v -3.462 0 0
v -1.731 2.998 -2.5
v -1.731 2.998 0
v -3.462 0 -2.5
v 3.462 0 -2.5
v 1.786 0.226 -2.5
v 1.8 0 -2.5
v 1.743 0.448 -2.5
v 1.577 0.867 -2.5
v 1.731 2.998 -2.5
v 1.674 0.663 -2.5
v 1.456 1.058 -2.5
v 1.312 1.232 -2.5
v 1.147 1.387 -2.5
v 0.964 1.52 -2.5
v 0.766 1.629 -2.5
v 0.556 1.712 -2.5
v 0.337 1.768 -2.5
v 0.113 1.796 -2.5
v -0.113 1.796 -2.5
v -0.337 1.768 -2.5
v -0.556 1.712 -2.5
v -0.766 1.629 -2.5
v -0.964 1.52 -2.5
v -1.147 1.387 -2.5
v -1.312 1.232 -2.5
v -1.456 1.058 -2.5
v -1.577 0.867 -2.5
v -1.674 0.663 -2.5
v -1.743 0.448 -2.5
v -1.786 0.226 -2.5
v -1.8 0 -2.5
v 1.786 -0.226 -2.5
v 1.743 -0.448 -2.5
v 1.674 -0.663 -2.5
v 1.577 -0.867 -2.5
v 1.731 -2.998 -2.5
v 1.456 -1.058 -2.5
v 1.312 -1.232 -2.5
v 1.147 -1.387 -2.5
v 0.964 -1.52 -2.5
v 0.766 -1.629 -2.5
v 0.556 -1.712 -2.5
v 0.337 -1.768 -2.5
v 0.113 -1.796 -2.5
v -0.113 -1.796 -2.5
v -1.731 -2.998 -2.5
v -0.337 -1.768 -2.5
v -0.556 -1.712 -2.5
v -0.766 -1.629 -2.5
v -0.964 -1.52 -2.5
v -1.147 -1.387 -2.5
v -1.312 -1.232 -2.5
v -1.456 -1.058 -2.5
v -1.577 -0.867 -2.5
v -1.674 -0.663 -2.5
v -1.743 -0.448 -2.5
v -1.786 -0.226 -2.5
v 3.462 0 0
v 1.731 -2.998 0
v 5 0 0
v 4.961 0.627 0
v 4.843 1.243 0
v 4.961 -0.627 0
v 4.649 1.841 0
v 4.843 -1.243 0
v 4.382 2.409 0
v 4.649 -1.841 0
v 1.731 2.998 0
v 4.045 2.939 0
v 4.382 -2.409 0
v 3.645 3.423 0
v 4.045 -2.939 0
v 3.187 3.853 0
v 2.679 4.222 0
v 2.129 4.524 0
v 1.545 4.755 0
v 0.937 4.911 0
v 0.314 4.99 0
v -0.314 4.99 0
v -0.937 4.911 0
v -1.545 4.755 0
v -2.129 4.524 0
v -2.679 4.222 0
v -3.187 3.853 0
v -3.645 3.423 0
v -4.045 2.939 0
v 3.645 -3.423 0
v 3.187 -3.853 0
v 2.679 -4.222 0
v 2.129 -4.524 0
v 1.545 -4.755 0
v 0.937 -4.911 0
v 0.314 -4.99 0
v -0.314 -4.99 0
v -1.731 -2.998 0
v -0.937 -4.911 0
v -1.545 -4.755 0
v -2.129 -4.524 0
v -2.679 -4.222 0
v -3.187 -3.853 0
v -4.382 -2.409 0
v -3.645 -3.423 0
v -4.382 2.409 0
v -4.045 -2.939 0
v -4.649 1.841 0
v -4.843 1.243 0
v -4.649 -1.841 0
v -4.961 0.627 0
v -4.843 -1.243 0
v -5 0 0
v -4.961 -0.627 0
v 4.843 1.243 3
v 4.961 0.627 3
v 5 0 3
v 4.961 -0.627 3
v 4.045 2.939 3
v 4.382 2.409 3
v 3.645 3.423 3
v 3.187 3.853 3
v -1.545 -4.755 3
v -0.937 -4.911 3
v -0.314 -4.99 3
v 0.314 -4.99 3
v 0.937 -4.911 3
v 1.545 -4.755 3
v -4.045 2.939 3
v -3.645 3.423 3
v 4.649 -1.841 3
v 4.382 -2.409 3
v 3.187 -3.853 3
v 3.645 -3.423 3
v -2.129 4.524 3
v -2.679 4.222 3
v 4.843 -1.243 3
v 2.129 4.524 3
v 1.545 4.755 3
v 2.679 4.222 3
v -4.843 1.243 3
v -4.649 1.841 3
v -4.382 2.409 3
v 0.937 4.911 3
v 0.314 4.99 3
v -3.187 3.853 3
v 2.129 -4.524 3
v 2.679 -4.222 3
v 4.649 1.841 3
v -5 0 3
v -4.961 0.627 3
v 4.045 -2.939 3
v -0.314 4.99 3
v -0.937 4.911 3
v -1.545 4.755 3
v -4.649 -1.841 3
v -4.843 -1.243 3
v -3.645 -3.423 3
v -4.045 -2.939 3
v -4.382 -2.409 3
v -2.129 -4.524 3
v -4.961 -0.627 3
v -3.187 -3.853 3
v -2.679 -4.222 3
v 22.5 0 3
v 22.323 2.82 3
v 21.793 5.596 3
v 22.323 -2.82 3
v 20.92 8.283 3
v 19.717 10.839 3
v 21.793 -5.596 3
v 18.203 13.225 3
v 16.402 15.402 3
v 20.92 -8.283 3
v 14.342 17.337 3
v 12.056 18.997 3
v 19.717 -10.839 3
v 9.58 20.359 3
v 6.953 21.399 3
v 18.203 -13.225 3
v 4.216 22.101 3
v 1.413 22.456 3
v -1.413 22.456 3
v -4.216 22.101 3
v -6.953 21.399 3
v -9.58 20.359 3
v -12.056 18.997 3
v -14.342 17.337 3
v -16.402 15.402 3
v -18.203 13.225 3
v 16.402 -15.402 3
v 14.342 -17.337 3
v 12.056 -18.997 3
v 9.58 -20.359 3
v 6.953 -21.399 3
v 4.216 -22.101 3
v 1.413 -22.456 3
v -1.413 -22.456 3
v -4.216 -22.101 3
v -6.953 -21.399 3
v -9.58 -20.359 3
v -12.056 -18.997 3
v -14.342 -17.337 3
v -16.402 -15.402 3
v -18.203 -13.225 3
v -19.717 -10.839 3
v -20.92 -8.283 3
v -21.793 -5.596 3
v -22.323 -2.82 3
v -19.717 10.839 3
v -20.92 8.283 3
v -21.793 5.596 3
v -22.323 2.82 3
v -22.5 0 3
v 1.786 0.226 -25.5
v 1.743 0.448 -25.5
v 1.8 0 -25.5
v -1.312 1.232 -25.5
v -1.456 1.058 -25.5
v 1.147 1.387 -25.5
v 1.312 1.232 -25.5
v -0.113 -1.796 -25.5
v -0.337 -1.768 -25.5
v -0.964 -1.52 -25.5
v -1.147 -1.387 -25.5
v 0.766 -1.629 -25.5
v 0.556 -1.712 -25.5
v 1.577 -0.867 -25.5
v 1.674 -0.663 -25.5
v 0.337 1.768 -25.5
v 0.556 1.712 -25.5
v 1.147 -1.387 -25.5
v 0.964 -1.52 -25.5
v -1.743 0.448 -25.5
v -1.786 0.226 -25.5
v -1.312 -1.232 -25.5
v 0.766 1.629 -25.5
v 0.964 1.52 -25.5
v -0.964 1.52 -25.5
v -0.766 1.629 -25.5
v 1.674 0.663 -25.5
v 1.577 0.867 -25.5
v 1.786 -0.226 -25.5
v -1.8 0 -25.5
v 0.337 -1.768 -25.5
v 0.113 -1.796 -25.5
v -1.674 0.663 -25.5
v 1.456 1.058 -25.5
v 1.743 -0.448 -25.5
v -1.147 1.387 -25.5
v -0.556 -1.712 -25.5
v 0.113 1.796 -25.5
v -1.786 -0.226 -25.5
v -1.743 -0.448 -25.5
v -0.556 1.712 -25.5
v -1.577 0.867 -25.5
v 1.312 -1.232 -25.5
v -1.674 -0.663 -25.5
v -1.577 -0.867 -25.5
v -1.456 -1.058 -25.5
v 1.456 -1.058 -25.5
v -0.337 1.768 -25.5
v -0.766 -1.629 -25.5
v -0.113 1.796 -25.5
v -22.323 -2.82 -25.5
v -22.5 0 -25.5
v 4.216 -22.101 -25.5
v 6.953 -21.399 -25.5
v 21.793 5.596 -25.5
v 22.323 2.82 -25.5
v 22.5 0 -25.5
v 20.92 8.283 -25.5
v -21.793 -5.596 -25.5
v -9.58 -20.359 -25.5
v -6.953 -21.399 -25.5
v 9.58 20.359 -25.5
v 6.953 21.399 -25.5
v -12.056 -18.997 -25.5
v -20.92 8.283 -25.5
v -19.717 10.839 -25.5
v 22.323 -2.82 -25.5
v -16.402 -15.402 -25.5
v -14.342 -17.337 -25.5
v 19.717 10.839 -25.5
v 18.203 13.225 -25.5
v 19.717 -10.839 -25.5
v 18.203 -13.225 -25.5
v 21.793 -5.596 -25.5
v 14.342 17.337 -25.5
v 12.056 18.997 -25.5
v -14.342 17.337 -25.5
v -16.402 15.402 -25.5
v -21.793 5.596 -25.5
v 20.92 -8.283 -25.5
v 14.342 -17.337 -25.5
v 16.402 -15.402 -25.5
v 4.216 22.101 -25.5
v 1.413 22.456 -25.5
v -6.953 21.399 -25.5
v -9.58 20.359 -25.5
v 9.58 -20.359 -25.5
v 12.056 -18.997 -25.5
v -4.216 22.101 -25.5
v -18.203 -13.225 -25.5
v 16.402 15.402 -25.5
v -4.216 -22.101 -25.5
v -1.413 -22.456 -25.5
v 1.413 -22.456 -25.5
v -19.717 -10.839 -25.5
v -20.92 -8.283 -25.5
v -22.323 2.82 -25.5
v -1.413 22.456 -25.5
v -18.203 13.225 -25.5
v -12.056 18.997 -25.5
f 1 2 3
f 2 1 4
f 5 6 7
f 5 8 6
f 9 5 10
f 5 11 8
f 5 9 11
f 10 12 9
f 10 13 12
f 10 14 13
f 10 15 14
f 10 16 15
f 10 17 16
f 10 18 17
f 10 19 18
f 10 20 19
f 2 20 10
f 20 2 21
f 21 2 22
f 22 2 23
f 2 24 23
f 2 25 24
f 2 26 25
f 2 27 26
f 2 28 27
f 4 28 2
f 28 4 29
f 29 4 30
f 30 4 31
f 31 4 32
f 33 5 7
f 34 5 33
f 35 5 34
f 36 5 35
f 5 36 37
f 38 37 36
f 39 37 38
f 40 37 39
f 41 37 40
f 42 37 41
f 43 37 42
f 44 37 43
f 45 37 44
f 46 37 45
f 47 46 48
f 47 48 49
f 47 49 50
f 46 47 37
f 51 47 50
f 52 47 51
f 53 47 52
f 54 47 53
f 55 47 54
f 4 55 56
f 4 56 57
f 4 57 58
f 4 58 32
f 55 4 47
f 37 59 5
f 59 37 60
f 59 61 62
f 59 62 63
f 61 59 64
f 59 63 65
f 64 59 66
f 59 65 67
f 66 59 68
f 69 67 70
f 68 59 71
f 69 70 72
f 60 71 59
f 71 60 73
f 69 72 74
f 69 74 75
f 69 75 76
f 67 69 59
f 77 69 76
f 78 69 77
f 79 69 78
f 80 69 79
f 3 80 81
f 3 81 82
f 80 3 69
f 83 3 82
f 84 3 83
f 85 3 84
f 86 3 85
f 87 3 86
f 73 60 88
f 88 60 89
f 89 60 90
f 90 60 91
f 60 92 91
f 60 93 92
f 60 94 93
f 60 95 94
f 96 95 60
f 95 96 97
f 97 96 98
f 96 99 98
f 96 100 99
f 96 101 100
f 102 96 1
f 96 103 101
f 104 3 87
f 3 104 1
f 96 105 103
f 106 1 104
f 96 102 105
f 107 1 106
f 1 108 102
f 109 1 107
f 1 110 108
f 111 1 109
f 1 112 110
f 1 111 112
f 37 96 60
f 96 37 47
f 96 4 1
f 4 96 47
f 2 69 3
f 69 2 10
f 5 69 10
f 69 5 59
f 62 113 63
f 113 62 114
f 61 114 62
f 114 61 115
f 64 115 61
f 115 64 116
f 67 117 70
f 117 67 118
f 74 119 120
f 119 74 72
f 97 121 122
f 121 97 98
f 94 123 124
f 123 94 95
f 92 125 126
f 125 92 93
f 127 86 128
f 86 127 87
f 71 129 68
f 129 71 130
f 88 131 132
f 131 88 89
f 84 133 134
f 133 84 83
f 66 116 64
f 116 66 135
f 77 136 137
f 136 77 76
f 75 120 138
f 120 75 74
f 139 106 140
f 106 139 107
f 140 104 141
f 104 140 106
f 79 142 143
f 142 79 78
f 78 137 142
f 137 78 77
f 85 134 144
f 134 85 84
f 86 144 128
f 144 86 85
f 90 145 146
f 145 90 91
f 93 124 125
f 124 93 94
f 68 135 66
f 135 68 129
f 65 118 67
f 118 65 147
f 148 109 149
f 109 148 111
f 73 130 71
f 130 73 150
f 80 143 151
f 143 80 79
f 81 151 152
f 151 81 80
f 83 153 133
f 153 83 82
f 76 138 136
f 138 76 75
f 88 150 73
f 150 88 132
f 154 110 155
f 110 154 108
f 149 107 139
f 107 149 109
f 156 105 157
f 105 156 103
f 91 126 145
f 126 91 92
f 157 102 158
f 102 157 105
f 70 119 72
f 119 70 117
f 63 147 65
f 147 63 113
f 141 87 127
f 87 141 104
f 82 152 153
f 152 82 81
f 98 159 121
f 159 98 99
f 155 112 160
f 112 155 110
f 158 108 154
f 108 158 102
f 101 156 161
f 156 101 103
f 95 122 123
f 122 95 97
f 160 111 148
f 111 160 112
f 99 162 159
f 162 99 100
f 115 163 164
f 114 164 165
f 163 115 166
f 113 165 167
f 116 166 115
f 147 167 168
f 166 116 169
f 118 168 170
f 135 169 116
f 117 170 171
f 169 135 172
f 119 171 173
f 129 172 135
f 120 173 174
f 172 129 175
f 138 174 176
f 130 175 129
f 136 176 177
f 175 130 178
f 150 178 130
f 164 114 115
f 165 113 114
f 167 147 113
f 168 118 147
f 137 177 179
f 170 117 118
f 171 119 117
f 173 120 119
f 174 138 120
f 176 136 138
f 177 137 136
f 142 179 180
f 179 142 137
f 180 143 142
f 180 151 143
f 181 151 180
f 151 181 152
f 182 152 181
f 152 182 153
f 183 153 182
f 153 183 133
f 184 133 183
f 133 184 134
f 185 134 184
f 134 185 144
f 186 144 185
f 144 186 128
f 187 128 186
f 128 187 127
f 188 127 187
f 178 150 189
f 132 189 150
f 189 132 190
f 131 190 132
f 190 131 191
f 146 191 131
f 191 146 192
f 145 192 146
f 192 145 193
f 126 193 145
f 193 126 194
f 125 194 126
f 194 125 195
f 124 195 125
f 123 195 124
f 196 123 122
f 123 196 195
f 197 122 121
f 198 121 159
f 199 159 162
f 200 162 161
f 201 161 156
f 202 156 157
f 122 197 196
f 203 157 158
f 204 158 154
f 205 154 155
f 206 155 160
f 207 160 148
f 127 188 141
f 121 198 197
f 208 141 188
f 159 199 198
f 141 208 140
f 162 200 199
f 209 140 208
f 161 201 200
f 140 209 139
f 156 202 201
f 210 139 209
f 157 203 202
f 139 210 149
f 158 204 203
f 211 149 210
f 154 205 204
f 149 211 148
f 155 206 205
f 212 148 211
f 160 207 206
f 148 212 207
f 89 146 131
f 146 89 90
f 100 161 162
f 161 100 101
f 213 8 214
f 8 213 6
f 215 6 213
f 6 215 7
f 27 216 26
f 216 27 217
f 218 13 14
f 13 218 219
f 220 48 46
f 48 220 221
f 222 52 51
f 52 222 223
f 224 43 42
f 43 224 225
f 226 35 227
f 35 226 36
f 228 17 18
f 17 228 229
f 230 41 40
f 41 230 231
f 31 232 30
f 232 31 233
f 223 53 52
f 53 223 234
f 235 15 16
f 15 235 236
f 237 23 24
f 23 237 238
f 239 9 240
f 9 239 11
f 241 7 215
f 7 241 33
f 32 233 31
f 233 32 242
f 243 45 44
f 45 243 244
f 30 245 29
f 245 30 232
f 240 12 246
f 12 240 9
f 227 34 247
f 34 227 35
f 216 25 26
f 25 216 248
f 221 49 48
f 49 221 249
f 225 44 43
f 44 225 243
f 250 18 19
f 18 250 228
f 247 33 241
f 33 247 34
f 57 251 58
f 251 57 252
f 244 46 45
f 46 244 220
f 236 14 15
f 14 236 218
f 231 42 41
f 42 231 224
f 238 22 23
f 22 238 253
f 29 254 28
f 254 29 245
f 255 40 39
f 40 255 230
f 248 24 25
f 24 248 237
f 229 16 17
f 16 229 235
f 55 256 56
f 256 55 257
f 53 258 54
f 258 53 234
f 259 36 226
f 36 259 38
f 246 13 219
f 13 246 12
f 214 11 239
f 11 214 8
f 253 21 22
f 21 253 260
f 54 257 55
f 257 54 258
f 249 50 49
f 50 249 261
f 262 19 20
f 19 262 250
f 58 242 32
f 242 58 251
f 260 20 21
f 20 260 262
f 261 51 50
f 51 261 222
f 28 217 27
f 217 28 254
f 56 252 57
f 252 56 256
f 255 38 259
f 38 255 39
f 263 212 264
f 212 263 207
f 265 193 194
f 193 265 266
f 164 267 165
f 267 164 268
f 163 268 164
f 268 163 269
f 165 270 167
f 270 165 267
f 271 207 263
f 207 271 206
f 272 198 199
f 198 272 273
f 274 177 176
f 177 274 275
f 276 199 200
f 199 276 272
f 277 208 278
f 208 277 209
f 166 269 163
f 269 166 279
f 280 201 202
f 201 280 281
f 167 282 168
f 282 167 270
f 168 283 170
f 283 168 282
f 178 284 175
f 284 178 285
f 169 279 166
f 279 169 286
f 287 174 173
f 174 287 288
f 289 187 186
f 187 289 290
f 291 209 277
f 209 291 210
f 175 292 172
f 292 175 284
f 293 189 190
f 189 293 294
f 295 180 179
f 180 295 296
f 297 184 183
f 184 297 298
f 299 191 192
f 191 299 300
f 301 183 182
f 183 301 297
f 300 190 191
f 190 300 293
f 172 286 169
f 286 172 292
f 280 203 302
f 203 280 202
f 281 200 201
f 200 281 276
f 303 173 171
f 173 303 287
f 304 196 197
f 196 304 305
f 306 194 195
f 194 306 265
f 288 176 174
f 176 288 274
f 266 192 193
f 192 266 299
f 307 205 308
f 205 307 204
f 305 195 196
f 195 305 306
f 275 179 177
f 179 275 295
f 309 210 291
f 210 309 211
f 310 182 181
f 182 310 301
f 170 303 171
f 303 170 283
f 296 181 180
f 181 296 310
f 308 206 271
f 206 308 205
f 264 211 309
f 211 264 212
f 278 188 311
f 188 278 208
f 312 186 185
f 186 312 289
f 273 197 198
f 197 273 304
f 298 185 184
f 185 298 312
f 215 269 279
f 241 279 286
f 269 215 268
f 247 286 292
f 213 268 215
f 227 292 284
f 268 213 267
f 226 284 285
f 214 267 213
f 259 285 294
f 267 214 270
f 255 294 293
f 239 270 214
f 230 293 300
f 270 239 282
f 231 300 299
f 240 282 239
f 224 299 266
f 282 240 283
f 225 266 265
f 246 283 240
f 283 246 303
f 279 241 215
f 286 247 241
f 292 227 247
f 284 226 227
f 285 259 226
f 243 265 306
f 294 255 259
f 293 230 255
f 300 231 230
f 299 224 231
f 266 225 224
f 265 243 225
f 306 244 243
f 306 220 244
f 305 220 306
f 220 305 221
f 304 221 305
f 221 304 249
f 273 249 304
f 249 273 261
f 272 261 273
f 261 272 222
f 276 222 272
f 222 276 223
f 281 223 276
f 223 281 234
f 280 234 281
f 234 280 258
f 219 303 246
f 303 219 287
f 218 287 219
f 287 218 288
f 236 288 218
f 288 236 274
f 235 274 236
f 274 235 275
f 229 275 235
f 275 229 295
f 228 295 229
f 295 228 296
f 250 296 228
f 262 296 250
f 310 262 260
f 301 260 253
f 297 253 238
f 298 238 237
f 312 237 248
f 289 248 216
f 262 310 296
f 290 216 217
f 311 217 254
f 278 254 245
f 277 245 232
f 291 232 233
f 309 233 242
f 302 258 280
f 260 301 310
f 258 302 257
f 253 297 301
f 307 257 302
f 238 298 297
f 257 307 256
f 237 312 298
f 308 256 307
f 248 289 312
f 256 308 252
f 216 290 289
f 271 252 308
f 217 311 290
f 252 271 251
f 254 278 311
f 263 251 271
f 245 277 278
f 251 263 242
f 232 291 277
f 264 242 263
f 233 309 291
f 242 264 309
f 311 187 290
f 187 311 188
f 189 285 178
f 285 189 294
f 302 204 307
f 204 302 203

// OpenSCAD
$fn = 50;


difference() {
	union() {
		translate(v = [0, 0, -25.5000000000]) {
			cylinder(h = 28.5000000000, r = 22.5000000000);
		}
	}
	union() {
		translate(v = [0, 0, 0]) {
			rotate(a = [0, 0, 0]) {
				difference() {
					union() {
						translate(v = [0, 0, -2.5000000000]) {
							linear_extrude(height = 2.5000000000) {
								polygon(points = [[3.4620000000, 0.0000000000], [1.7310000000, 2.9981799479], [-1.7310000000, 2.9981799479], [-3.4620000000, 0.0000000000], [-1.7310000000, -2.9981799479], [1.7310000000, -2.9981799479]]);
							}
						}
					}
					union();
				}
			}
		}
		#cylinder(h = 3, r = 5.0000000000);
		#translate(v = [0, 0, -100.0000000000]) {
			cylinder(h = 200, r = 1.8000000000);
		}
	}
}
